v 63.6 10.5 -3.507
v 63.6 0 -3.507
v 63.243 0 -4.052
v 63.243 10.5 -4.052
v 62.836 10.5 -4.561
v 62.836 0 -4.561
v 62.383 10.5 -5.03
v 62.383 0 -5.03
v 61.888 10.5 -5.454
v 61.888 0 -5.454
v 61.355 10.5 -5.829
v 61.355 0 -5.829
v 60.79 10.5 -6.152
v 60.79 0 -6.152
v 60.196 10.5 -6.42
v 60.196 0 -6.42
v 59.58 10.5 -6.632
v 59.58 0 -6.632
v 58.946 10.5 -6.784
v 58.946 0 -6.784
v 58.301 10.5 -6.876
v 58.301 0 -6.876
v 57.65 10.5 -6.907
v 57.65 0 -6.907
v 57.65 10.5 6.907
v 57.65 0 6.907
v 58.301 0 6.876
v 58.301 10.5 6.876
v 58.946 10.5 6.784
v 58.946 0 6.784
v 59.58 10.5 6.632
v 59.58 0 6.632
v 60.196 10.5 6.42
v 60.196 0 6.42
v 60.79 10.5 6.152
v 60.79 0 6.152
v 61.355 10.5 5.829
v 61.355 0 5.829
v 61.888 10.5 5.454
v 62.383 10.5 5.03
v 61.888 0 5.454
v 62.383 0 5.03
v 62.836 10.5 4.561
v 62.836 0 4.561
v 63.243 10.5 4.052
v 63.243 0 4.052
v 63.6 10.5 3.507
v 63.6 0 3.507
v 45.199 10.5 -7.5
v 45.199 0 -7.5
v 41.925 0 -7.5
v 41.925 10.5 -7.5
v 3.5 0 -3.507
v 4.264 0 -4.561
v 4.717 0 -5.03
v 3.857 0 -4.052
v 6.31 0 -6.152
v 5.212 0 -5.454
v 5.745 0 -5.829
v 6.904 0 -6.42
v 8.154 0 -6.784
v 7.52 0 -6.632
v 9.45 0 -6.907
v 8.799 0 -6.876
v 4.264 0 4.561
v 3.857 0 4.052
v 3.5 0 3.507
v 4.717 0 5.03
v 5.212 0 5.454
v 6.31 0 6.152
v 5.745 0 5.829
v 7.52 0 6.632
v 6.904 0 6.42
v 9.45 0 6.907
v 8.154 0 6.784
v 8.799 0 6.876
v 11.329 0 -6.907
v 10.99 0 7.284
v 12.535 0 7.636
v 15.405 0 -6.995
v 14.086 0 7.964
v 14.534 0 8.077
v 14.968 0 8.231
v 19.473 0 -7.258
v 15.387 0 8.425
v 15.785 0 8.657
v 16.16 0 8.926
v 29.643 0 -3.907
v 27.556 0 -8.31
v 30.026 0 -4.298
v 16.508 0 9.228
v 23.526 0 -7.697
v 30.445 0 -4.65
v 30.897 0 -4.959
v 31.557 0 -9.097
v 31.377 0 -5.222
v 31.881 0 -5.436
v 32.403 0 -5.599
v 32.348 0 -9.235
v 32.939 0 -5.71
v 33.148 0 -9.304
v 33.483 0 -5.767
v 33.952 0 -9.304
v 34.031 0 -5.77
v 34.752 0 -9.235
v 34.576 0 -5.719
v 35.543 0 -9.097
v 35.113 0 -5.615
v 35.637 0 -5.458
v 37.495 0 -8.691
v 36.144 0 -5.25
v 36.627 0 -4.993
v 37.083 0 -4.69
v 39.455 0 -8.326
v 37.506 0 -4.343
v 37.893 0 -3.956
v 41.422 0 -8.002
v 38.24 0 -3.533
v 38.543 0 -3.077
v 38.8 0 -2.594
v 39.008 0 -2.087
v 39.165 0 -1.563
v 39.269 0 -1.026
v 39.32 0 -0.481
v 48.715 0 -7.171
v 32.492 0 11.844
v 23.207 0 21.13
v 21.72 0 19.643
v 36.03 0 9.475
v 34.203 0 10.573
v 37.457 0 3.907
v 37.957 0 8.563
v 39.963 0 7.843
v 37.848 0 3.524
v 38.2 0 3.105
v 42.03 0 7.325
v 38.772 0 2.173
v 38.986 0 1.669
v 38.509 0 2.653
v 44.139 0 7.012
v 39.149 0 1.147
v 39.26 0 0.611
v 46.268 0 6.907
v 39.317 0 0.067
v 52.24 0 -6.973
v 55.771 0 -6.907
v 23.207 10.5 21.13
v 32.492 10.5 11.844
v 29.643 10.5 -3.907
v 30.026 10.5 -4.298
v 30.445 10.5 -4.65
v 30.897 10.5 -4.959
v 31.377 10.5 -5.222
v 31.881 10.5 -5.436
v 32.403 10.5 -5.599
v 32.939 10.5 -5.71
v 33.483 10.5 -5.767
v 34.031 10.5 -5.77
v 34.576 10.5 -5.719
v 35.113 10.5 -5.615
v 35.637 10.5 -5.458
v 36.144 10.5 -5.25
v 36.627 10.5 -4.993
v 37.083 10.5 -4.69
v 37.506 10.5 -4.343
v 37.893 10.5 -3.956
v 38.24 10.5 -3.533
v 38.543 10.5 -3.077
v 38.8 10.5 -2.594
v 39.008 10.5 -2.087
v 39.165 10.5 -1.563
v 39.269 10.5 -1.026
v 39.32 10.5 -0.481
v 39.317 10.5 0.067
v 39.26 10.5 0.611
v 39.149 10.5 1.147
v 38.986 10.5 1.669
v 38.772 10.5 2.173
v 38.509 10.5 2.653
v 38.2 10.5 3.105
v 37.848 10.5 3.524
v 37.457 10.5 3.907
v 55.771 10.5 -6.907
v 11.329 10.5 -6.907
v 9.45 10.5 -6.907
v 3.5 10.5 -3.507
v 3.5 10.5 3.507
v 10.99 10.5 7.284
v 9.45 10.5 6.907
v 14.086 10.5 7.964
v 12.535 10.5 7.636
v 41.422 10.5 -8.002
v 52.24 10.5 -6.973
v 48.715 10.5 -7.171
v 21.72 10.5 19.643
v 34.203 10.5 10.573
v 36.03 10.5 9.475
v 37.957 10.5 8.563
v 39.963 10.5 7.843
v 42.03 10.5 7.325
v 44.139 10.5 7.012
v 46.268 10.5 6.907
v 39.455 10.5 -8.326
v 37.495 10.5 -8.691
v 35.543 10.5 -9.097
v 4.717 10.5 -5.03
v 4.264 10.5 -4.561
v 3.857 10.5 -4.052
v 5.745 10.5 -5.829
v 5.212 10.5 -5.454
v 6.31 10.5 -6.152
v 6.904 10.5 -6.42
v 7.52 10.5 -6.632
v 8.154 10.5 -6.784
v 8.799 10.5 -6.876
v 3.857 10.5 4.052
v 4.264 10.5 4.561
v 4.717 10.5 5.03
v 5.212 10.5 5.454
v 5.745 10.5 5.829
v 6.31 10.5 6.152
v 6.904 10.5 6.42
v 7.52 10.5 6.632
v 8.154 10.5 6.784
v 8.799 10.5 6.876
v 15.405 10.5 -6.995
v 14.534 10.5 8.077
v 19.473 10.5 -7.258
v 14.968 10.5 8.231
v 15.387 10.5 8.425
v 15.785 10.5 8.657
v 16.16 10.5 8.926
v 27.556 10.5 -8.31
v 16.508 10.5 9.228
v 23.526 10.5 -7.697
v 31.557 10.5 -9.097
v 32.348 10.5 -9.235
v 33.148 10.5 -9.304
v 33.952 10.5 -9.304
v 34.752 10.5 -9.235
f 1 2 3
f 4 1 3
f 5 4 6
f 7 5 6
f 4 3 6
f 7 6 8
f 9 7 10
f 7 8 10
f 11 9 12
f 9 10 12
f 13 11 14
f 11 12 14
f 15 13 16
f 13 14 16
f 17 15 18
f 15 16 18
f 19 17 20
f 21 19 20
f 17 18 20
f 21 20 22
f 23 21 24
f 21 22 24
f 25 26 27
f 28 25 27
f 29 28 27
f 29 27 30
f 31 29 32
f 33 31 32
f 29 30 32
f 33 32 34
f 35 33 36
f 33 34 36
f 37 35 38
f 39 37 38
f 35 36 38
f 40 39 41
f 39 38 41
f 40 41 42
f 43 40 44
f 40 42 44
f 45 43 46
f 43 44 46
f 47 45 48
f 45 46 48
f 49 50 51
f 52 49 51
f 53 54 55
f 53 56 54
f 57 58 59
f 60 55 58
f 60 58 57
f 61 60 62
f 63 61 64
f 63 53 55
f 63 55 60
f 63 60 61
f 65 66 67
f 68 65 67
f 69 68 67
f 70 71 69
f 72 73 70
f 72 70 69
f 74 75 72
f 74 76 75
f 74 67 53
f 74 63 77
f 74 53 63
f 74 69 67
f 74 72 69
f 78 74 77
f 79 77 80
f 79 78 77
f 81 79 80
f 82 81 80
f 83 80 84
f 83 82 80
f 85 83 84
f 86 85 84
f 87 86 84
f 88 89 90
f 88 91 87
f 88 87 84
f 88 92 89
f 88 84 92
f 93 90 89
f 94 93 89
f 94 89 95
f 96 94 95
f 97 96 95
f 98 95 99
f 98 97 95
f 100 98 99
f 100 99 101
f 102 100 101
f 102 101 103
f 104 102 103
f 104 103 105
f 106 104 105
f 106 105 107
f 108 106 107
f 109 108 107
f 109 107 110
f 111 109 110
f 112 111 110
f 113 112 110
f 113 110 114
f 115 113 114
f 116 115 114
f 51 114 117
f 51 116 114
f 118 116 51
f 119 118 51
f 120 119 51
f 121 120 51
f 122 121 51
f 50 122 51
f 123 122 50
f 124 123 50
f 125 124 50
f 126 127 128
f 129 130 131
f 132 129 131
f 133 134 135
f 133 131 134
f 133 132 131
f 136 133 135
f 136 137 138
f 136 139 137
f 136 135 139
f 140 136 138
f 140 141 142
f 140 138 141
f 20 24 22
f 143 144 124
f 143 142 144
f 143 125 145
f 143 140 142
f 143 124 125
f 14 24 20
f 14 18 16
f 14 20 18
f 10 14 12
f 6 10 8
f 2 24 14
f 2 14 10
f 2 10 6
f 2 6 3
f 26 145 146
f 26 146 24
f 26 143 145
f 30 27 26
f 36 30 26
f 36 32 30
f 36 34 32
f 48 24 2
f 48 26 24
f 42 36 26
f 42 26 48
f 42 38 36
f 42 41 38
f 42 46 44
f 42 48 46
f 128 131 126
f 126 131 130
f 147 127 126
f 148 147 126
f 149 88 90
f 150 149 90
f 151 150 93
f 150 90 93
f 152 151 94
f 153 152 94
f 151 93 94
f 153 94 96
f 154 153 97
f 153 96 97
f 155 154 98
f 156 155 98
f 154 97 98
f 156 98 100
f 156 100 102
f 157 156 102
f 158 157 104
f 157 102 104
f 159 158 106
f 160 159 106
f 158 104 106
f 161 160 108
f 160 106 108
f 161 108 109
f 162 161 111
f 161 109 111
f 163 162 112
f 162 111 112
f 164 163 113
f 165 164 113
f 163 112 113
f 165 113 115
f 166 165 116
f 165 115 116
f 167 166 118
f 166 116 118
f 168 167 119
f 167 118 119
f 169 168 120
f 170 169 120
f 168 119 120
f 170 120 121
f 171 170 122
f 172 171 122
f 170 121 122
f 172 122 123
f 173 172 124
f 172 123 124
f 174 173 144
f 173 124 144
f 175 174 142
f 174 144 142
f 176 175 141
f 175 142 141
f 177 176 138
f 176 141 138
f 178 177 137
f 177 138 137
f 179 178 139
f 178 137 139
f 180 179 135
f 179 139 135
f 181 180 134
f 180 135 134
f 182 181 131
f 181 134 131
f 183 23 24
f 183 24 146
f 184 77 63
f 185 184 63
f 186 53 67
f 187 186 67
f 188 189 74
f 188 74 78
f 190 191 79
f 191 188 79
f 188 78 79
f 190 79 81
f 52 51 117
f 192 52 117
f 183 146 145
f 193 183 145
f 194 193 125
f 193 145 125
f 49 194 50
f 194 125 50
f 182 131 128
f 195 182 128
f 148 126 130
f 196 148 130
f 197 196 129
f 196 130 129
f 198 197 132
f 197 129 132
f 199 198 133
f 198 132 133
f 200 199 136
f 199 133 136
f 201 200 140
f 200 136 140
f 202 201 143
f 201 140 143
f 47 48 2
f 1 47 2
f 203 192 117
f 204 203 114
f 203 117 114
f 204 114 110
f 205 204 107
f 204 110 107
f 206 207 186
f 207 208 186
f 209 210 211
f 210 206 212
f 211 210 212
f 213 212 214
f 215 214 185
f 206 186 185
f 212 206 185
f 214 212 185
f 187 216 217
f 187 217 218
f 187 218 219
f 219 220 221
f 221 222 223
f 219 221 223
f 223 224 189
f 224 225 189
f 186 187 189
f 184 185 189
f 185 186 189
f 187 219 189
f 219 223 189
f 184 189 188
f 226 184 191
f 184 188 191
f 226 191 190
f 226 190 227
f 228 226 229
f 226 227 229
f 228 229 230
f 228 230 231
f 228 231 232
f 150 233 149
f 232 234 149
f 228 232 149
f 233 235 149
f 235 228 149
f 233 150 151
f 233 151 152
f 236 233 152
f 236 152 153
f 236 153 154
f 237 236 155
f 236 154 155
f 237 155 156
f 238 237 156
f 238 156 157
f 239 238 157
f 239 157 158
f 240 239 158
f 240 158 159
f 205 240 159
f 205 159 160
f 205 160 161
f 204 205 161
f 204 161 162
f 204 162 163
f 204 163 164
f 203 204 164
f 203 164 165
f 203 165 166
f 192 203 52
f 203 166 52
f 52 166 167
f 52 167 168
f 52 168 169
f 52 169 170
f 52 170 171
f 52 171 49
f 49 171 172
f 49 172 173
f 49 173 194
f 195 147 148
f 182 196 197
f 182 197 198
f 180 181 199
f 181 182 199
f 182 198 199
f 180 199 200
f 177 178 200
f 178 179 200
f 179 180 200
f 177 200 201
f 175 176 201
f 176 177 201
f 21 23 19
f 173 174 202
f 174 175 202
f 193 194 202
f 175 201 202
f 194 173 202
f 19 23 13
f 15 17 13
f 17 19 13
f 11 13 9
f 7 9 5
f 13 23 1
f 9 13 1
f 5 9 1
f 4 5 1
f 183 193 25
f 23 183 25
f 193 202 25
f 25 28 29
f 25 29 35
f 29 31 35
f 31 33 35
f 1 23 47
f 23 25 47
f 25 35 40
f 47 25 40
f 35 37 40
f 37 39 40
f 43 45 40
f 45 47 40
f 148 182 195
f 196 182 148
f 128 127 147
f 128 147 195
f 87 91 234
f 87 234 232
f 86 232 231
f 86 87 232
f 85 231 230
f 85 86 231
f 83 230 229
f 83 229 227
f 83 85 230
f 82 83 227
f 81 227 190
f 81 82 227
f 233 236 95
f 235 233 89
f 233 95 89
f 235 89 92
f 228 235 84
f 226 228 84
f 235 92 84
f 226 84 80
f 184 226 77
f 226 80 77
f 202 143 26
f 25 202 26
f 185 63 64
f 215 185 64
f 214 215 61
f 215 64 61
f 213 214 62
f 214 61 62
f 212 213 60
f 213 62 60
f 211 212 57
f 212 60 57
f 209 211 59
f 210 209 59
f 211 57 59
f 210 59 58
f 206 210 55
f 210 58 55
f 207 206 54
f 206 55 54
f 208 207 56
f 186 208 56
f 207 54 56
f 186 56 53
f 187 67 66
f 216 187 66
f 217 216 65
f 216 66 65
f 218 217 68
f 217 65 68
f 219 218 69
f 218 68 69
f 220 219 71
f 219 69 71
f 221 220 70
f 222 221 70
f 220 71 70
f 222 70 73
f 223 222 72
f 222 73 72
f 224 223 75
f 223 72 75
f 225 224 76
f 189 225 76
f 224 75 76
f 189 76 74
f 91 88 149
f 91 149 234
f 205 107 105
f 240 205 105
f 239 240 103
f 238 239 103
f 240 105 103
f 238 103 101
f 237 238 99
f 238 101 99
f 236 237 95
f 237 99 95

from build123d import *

# Parameters (mm, degrees)
BOSS_EXTRUDE2_DEPTH = 10.5
BOSS_EXTRUDE3_DEPTH = 10.5
FILLET1_R           = 100


with BuildPart() as part:
    # Sketch1 → Boss-Extrude2 (new body)
    with BuildSketch(Plane(origin=(0, 0, 0), x_dir=(1, 0, 0), z_dir=(0, 1, 0))):
        with BuildLine():
            Line((3.5, 3.507264218), (3.5, -3.507264218))
            ThreePointArc((3.5, -3.507264218), (6.023664299, -5.996968064), (9.45, -6.906764966))
            ThreePointArc((9.45, -6.906764966), (13.341155227, -5.869242314), (17.152471347, -7.169785158))
            ThreePointArc((17.152471347, -7.169785158), (17.367404774, -7.330790599), (17.575940883, -7.5))
            Line((17.575940883, -7.5), (18.236470068, -7.5))
            Line((18.236470068, -7.5), (29.643235034, 3.906764966))
            ThreePointArc((29.643235034, 3.906764966), (37.704252339, 4.154252339), (37.456764966, -3.906764966))
            Line((37.456764966, -3.906764966), (25.736470068, -15.627059864))
            Line((25.736470068, -15.627059864), (27.222899263, -17.113489059))
            Line((27.222899263, -17.113489059), (32.492349737, -11.844038585))
            ThreePointArc((32.492349737, -11.844038585), (38.950911947, -8.178365919), (46.267551404, -6.906764966))
            Line((46.267551404, -6.906764966), (57.65, -6.906764966))
            ThreePointArc((57.65, -6.906764966), (61.076335701, -5.996968064), (63.6, -3.507264218))
            Line((63.6, -3.507264218), (63.6, 3.507264218))
            ThreePointArc((63.6, 3.507264218), (61.076335701, 5.996968064), (57.65, 6.906764966))
            Line((57.65, 6.906764966), (55.770931212, 6.906764966))
            ThreePointArc((55.770931212, 6.906764966), (50.476561055, 7.055190286), (45.19882198, 7.5))
            Line((45.19882198, 7.5), (41.924547238, 7.5))
            Line((41.924547238, 7.5), (41.422065041, 8.002482197))
            ThreePointArc((41.422065041, 8.002482197), (38.474068809, 8.503220626), (35.543391077, 9.09697881))
            ThreePointArc((35.543391077, 9.09697881), (33.55, 9.312820811), (31.556608923, 9.09697881))
            ThreePointArc((31.556608923, 9.09697881), (21.501954522, 7.455914007), (11.329068788, 6.906764966))
            Line((11.329068788, 6.906764966), (9.45, 6.906764966))
            ThreePointArc((9.45, 6.906764966), (6.023664299, 5.996968064), (3.5, 3.507264218))
        make_face()
    extrude(amount=BOSS_EXTRUDE2_DEPTH)

    # Sketch4 → Boss-Extrude3 (add)
    with BuildSketch(Plane.XZ):
        with BuildLine():
            ThreePointArc((17.575940883, 7.5), (17.752085177, 7.65383798), (17.922940136, 7.813529932))
            Line((17.922940136, 7.813529932), (16.508443005, 9.228027063))
            ThreePointArc((16.508443005, 9.228027063), (13.612622768, 7.891439794), (10.504365982, 8.606268534))
            Line((10.504365982, 8.606268534), (9.45, 6.906764966))
            ThreePointArc((9.45, 6.906764966), (13.609320969, 5.883604236), (17.575940883, 7.5))
        make_face()
        with BuildLine():
            Line((17.575940883, 7.5), (18.236470068, 7.5))
            Line((18.236470068, 7.5), (17.922940136, 7.813529932))
            ThreePointArc((17.922940136, 7.813529932), (17.752085177, 7.65383798), (17.575940883, 7.5))
        make_face()
        Polygon((21.720364105, 19.643165827), (25.736470068, 15.627059864), (26.69888256, 16.589472356), (27.222899263, 17.113489059), (23.2067933, 21.129595022), align=None)
    extrude(amount=-BOSS_EXTRUDE3_DEPTH)

    # Fillet1
    # the kernel refuses this fillet: 100 mm, written as the material it takes off along each edge
    with BuildSketch(Plane(origin=(10.504365982, -9.09791834, 8.606268534), x_dir=(0.9842985265929657, 0, -0.17651178585838628), z_dir=(0, 1, 0))) as fillet1_piece_1:
        with BuildLine():
            CenterArc((40.530590954, 92.946344003), FILLET1_R, 245.626436409, 2.724892596)
            Line((-0.737828472, 1.85892688), (-1.563196861, 0.037178538))
            ThreePointArc((-1.563196861, 0.037178538), (-2.227841116, 0.191634968), (-1.85892688, -0.737828472))
            Line((-1.85892688, -0.737828472), (0.737828472, -1.85892688))
            ThreePointArc((0.737828472, -1.85892688), (1.819583668, -1.652094823), (2.901338864, -1.85892688))
            Line((2.901338864, -1.85892688), (3.639167336, 0))
        make_face()
    extrude(amount=28.69583668, mode=Mode.SUBTRACT)


solid = part.part
